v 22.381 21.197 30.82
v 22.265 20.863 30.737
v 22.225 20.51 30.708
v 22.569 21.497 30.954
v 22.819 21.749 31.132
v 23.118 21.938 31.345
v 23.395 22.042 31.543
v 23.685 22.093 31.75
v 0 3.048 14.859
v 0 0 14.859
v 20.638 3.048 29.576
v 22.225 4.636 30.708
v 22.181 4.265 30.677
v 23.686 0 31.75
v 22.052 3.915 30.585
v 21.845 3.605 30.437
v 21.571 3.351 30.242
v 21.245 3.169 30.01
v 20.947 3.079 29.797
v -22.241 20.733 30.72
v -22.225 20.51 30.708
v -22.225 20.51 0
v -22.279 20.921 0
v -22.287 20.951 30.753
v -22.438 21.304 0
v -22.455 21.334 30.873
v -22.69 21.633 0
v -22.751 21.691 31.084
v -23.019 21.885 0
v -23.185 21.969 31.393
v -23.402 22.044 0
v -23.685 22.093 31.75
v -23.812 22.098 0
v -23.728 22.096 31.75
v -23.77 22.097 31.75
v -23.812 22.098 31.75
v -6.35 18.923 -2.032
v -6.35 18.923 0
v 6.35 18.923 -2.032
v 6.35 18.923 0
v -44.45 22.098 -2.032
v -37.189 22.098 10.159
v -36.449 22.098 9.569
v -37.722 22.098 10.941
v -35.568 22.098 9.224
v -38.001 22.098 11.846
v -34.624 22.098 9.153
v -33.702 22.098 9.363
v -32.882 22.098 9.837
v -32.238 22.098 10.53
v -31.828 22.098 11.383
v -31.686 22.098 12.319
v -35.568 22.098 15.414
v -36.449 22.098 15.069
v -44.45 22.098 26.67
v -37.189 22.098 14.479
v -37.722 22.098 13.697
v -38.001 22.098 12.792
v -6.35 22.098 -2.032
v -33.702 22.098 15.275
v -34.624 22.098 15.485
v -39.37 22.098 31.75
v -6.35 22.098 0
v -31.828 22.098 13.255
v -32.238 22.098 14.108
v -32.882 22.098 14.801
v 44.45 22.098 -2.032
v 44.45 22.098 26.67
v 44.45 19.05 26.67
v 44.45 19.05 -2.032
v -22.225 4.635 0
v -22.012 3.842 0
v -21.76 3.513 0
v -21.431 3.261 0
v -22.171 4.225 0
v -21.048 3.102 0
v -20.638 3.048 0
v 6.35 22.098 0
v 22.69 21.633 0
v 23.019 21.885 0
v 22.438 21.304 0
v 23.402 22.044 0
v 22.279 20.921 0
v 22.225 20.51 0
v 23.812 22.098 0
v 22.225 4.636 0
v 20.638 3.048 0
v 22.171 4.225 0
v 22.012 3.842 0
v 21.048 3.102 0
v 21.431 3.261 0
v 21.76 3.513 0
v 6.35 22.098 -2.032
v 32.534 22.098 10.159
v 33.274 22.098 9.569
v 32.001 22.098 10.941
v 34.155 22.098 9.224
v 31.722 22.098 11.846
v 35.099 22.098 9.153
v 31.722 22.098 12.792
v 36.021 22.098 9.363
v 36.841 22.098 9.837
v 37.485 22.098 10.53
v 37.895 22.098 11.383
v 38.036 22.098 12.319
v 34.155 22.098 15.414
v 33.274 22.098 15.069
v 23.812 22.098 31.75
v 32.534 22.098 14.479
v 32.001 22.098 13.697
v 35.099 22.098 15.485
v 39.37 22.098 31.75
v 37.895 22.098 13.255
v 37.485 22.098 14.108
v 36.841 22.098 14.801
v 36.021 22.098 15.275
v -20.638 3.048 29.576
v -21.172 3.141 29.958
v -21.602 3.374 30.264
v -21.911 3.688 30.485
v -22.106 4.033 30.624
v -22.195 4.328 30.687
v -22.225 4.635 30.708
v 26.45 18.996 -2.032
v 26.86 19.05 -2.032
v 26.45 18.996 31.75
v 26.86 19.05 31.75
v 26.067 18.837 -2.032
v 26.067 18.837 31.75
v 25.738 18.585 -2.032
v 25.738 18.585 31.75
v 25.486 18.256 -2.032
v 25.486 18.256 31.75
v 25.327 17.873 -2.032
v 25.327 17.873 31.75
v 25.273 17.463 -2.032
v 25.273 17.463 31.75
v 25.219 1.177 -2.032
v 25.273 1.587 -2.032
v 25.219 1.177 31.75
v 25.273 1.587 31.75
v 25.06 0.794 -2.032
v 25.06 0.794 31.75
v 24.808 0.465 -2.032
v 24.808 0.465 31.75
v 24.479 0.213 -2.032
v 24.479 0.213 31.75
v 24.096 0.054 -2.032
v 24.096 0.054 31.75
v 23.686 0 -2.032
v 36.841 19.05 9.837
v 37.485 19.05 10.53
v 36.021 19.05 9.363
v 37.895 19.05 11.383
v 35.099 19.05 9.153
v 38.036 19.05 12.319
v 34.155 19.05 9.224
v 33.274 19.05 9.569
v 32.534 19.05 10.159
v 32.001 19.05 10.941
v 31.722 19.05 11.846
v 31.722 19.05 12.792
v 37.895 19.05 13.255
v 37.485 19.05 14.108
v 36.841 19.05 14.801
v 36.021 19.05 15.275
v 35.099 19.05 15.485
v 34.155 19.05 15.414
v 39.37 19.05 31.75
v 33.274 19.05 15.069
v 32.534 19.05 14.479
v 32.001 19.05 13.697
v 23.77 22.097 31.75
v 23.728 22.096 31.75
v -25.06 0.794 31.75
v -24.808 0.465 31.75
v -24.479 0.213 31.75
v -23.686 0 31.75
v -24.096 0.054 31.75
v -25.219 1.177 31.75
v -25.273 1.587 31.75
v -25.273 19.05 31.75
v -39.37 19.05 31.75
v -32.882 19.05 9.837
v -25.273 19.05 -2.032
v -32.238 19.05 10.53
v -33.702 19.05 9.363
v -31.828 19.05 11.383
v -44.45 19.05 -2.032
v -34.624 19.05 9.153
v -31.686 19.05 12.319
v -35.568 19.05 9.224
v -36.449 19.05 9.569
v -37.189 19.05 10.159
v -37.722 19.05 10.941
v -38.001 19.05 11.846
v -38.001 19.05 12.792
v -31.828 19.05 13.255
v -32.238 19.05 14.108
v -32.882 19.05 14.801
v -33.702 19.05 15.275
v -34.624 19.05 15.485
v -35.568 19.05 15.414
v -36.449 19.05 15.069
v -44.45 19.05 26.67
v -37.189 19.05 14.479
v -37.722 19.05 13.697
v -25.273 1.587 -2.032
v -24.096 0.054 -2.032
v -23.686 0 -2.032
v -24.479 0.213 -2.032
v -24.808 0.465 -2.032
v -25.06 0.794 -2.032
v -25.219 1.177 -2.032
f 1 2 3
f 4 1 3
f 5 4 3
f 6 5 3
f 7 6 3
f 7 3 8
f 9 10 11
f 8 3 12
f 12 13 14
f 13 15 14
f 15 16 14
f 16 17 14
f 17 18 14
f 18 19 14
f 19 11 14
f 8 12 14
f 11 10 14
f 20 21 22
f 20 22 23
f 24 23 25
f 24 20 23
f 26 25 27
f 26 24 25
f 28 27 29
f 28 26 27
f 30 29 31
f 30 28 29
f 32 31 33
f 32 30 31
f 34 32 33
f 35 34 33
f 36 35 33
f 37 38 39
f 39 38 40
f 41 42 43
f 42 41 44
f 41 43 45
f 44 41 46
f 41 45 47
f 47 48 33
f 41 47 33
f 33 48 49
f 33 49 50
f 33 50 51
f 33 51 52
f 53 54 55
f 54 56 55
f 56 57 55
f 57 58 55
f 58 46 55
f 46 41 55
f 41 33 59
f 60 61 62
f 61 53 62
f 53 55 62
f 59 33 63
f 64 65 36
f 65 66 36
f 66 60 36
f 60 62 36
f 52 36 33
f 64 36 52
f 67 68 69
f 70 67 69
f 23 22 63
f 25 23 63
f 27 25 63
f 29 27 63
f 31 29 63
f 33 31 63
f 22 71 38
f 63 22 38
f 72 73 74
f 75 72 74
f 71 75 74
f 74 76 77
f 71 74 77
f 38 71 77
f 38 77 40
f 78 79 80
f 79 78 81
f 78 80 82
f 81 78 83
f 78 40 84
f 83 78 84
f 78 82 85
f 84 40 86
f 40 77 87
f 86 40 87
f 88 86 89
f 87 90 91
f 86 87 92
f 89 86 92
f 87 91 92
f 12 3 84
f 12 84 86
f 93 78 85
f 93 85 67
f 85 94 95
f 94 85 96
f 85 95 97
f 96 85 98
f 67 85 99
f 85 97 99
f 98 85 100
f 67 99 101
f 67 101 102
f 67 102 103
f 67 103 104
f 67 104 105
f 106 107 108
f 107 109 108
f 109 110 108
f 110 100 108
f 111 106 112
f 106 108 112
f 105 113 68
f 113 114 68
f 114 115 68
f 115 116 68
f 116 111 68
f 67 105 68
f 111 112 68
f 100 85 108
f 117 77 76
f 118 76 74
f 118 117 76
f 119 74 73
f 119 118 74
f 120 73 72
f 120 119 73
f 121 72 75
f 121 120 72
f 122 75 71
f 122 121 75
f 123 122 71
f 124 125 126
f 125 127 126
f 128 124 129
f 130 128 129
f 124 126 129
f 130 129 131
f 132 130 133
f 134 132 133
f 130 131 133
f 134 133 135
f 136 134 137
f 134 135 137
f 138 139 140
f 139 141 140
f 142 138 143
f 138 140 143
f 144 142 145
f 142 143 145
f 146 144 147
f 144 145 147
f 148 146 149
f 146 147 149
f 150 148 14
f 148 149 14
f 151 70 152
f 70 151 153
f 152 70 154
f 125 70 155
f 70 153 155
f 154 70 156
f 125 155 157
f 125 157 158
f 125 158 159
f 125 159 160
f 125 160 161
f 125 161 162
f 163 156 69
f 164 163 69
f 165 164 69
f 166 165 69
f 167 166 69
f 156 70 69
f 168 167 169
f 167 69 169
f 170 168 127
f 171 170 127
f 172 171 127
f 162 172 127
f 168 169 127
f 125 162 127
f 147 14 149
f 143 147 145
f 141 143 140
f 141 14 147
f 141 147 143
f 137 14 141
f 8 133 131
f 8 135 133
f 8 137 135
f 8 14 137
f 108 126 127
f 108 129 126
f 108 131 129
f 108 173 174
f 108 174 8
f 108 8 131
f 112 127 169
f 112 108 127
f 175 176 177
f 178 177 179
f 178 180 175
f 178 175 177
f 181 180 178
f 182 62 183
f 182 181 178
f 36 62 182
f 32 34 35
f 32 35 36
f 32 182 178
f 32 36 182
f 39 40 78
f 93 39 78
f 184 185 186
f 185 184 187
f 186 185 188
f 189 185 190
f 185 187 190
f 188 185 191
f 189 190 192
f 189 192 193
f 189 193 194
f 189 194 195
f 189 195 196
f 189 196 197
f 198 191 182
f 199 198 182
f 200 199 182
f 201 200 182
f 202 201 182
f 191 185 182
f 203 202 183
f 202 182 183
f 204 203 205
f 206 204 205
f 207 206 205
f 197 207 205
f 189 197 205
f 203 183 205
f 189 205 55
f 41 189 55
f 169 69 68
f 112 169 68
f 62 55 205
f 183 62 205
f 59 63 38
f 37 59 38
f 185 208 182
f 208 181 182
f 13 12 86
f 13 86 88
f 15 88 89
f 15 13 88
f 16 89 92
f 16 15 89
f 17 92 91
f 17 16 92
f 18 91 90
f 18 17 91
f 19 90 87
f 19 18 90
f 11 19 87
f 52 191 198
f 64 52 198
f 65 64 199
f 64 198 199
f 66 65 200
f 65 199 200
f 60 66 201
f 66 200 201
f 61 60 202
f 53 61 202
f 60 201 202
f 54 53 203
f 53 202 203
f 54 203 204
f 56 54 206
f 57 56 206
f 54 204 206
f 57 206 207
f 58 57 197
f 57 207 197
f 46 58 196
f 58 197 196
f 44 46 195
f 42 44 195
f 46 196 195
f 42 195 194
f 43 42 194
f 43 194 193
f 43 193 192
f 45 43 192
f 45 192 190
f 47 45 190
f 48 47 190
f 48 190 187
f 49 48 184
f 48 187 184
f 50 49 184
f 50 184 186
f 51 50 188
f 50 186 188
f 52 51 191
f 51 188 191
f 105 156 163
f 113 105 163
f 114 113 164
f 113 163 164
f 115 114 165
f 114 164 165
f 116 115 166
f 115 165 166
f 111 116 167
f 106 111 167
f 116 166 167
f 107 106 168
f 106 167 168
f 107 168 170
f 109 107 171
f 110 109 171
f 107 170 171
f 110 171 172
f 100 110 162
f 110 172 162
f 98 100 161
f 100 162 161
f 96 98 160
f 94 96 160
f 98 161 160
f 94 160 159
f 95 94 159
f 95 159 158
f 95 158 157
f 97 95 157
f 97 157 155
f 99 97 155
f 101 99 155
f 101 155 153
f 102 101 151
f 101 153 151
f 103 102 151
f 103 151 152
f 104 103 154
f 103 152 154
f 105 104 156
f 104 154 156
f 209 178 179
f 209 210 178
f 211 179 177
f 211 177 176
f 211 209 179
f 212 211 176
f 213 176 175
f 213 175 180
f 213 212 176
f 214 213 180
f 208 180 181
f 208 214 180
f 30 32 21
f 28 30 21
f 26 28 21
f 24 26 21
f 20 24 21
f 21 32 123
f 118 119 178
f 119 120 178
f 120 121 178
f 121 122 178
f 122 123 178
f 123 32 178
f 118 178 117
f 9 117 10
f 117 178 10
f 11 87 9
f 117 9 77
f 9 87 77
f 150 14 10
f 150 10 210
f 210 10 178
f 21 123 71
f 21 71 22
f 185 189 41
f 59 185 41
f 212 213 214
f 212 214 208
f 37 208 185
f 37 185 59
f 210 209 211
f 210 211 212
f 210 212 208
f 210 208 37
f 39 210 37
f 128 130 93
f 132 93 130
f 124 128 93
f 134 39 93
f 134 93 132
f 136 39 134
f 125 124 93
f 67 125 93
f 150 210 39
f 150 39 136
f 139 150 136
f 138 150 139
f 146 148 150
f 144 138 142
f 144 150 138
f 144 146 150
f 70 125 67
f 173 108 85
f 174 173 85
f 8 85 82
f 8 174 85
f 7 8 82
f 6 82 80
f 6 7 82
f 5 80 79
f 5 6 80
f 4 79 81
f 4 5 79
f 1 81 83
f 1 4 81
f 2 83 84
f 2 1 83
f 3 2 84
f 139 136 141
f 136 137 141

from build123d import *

# Parameters (mm, degrees)
F1_DEPTH = 31.75
F3_DEPTH = 2.032
F4_SIZE  = 5.08
F5_R     = 3.175
F6_DEPTH = 3.048
F7_R     = 1.5875
F9_DEPTH = 22.0939118459


with BuildPart() as f1:
    # F0 (on Top) → F1 (new body)
    with BuildSketch(Plane.XY):
        Polygon((-25.273, 19.05), (-25.273, 0), (25.273, 0), (25.273, 19.05), (44.45, 19.05), (44.45, 22.098), (22.225, 22.098), (22.225, 3.048), (-22.225, 3.048), (-22.225, 22.098), (-44.45, 22.098), (-44.45, 19.05), align=None)
    extrude(amount=F1_DEPTH)

    # F2 (on face) → F3 (join)
    with BuildSketch(Plane(origin=(0, 0, 0), x_dir=(1, 0, 0), z_dir=(0, 0, -1))):
        Polygon((25.273, 0), (-25.273, 0), (-25.273, -19.05), (-44.45, -19.05), (-44.45, -22.098), (-25.273, -22.098), (-6.35, -22.098), (-6.35, -18.923), (6.35, -18.923), (6.35, -22.098), (25.273, -22.098), (44.45, -22.098), (44.45, -19.05), (25.273, -19.05), align=None)
    extrude(amount=F3_DEPTH)

    # F4
    f4_edges = [f1.edges().sort_by_distance(p)[0] for p in [
        (44.45, 20.574, 31.75),
        (-44.45, 20.574, 31.75),
    ]]
    chamfer(f4_edges, length=F4_SIZE)

    # F5 (on face) → F6 (cut, through all)
    with BuildSketch(Plane.XZ.offset(-19.05)):
        with Locations((-34.8615, 12.319)):
            Circle(F5_R)
        with Locations((34.8615, 12.319)):
            Circle(F5_R)
    extrude(amount=-F6_DEPTH, mode=Mode.SUBTRACT)

    # F7
    f7_edges = [f1.edges().sort_by_distance(p)[0] for p in [
        (25.273, 0, 14.859),
        (-25.273, 0, 14.859),
        (25.273, 19.05, 14.859),
        (22.225, 3.048, 15.875),
        (22.225, 22.098, 15.875),
        (-22.225, 3.048, 15.875),
        (-22.225, 22.098, 15.875),
    ]]
    fillet(f7_edges, radius=F7_R)

    # F8 (on face) → F9 (cut, through all)
    with BuildSketch(Plane.XZ):
        Polygon((23.6855, 31.75), (-23.6855, 31.75), (0, 14.859), align=None)
    extrude(amount=-F9_DEPTH, mode=Mode.SUBTRACT)


solid = f1.part
